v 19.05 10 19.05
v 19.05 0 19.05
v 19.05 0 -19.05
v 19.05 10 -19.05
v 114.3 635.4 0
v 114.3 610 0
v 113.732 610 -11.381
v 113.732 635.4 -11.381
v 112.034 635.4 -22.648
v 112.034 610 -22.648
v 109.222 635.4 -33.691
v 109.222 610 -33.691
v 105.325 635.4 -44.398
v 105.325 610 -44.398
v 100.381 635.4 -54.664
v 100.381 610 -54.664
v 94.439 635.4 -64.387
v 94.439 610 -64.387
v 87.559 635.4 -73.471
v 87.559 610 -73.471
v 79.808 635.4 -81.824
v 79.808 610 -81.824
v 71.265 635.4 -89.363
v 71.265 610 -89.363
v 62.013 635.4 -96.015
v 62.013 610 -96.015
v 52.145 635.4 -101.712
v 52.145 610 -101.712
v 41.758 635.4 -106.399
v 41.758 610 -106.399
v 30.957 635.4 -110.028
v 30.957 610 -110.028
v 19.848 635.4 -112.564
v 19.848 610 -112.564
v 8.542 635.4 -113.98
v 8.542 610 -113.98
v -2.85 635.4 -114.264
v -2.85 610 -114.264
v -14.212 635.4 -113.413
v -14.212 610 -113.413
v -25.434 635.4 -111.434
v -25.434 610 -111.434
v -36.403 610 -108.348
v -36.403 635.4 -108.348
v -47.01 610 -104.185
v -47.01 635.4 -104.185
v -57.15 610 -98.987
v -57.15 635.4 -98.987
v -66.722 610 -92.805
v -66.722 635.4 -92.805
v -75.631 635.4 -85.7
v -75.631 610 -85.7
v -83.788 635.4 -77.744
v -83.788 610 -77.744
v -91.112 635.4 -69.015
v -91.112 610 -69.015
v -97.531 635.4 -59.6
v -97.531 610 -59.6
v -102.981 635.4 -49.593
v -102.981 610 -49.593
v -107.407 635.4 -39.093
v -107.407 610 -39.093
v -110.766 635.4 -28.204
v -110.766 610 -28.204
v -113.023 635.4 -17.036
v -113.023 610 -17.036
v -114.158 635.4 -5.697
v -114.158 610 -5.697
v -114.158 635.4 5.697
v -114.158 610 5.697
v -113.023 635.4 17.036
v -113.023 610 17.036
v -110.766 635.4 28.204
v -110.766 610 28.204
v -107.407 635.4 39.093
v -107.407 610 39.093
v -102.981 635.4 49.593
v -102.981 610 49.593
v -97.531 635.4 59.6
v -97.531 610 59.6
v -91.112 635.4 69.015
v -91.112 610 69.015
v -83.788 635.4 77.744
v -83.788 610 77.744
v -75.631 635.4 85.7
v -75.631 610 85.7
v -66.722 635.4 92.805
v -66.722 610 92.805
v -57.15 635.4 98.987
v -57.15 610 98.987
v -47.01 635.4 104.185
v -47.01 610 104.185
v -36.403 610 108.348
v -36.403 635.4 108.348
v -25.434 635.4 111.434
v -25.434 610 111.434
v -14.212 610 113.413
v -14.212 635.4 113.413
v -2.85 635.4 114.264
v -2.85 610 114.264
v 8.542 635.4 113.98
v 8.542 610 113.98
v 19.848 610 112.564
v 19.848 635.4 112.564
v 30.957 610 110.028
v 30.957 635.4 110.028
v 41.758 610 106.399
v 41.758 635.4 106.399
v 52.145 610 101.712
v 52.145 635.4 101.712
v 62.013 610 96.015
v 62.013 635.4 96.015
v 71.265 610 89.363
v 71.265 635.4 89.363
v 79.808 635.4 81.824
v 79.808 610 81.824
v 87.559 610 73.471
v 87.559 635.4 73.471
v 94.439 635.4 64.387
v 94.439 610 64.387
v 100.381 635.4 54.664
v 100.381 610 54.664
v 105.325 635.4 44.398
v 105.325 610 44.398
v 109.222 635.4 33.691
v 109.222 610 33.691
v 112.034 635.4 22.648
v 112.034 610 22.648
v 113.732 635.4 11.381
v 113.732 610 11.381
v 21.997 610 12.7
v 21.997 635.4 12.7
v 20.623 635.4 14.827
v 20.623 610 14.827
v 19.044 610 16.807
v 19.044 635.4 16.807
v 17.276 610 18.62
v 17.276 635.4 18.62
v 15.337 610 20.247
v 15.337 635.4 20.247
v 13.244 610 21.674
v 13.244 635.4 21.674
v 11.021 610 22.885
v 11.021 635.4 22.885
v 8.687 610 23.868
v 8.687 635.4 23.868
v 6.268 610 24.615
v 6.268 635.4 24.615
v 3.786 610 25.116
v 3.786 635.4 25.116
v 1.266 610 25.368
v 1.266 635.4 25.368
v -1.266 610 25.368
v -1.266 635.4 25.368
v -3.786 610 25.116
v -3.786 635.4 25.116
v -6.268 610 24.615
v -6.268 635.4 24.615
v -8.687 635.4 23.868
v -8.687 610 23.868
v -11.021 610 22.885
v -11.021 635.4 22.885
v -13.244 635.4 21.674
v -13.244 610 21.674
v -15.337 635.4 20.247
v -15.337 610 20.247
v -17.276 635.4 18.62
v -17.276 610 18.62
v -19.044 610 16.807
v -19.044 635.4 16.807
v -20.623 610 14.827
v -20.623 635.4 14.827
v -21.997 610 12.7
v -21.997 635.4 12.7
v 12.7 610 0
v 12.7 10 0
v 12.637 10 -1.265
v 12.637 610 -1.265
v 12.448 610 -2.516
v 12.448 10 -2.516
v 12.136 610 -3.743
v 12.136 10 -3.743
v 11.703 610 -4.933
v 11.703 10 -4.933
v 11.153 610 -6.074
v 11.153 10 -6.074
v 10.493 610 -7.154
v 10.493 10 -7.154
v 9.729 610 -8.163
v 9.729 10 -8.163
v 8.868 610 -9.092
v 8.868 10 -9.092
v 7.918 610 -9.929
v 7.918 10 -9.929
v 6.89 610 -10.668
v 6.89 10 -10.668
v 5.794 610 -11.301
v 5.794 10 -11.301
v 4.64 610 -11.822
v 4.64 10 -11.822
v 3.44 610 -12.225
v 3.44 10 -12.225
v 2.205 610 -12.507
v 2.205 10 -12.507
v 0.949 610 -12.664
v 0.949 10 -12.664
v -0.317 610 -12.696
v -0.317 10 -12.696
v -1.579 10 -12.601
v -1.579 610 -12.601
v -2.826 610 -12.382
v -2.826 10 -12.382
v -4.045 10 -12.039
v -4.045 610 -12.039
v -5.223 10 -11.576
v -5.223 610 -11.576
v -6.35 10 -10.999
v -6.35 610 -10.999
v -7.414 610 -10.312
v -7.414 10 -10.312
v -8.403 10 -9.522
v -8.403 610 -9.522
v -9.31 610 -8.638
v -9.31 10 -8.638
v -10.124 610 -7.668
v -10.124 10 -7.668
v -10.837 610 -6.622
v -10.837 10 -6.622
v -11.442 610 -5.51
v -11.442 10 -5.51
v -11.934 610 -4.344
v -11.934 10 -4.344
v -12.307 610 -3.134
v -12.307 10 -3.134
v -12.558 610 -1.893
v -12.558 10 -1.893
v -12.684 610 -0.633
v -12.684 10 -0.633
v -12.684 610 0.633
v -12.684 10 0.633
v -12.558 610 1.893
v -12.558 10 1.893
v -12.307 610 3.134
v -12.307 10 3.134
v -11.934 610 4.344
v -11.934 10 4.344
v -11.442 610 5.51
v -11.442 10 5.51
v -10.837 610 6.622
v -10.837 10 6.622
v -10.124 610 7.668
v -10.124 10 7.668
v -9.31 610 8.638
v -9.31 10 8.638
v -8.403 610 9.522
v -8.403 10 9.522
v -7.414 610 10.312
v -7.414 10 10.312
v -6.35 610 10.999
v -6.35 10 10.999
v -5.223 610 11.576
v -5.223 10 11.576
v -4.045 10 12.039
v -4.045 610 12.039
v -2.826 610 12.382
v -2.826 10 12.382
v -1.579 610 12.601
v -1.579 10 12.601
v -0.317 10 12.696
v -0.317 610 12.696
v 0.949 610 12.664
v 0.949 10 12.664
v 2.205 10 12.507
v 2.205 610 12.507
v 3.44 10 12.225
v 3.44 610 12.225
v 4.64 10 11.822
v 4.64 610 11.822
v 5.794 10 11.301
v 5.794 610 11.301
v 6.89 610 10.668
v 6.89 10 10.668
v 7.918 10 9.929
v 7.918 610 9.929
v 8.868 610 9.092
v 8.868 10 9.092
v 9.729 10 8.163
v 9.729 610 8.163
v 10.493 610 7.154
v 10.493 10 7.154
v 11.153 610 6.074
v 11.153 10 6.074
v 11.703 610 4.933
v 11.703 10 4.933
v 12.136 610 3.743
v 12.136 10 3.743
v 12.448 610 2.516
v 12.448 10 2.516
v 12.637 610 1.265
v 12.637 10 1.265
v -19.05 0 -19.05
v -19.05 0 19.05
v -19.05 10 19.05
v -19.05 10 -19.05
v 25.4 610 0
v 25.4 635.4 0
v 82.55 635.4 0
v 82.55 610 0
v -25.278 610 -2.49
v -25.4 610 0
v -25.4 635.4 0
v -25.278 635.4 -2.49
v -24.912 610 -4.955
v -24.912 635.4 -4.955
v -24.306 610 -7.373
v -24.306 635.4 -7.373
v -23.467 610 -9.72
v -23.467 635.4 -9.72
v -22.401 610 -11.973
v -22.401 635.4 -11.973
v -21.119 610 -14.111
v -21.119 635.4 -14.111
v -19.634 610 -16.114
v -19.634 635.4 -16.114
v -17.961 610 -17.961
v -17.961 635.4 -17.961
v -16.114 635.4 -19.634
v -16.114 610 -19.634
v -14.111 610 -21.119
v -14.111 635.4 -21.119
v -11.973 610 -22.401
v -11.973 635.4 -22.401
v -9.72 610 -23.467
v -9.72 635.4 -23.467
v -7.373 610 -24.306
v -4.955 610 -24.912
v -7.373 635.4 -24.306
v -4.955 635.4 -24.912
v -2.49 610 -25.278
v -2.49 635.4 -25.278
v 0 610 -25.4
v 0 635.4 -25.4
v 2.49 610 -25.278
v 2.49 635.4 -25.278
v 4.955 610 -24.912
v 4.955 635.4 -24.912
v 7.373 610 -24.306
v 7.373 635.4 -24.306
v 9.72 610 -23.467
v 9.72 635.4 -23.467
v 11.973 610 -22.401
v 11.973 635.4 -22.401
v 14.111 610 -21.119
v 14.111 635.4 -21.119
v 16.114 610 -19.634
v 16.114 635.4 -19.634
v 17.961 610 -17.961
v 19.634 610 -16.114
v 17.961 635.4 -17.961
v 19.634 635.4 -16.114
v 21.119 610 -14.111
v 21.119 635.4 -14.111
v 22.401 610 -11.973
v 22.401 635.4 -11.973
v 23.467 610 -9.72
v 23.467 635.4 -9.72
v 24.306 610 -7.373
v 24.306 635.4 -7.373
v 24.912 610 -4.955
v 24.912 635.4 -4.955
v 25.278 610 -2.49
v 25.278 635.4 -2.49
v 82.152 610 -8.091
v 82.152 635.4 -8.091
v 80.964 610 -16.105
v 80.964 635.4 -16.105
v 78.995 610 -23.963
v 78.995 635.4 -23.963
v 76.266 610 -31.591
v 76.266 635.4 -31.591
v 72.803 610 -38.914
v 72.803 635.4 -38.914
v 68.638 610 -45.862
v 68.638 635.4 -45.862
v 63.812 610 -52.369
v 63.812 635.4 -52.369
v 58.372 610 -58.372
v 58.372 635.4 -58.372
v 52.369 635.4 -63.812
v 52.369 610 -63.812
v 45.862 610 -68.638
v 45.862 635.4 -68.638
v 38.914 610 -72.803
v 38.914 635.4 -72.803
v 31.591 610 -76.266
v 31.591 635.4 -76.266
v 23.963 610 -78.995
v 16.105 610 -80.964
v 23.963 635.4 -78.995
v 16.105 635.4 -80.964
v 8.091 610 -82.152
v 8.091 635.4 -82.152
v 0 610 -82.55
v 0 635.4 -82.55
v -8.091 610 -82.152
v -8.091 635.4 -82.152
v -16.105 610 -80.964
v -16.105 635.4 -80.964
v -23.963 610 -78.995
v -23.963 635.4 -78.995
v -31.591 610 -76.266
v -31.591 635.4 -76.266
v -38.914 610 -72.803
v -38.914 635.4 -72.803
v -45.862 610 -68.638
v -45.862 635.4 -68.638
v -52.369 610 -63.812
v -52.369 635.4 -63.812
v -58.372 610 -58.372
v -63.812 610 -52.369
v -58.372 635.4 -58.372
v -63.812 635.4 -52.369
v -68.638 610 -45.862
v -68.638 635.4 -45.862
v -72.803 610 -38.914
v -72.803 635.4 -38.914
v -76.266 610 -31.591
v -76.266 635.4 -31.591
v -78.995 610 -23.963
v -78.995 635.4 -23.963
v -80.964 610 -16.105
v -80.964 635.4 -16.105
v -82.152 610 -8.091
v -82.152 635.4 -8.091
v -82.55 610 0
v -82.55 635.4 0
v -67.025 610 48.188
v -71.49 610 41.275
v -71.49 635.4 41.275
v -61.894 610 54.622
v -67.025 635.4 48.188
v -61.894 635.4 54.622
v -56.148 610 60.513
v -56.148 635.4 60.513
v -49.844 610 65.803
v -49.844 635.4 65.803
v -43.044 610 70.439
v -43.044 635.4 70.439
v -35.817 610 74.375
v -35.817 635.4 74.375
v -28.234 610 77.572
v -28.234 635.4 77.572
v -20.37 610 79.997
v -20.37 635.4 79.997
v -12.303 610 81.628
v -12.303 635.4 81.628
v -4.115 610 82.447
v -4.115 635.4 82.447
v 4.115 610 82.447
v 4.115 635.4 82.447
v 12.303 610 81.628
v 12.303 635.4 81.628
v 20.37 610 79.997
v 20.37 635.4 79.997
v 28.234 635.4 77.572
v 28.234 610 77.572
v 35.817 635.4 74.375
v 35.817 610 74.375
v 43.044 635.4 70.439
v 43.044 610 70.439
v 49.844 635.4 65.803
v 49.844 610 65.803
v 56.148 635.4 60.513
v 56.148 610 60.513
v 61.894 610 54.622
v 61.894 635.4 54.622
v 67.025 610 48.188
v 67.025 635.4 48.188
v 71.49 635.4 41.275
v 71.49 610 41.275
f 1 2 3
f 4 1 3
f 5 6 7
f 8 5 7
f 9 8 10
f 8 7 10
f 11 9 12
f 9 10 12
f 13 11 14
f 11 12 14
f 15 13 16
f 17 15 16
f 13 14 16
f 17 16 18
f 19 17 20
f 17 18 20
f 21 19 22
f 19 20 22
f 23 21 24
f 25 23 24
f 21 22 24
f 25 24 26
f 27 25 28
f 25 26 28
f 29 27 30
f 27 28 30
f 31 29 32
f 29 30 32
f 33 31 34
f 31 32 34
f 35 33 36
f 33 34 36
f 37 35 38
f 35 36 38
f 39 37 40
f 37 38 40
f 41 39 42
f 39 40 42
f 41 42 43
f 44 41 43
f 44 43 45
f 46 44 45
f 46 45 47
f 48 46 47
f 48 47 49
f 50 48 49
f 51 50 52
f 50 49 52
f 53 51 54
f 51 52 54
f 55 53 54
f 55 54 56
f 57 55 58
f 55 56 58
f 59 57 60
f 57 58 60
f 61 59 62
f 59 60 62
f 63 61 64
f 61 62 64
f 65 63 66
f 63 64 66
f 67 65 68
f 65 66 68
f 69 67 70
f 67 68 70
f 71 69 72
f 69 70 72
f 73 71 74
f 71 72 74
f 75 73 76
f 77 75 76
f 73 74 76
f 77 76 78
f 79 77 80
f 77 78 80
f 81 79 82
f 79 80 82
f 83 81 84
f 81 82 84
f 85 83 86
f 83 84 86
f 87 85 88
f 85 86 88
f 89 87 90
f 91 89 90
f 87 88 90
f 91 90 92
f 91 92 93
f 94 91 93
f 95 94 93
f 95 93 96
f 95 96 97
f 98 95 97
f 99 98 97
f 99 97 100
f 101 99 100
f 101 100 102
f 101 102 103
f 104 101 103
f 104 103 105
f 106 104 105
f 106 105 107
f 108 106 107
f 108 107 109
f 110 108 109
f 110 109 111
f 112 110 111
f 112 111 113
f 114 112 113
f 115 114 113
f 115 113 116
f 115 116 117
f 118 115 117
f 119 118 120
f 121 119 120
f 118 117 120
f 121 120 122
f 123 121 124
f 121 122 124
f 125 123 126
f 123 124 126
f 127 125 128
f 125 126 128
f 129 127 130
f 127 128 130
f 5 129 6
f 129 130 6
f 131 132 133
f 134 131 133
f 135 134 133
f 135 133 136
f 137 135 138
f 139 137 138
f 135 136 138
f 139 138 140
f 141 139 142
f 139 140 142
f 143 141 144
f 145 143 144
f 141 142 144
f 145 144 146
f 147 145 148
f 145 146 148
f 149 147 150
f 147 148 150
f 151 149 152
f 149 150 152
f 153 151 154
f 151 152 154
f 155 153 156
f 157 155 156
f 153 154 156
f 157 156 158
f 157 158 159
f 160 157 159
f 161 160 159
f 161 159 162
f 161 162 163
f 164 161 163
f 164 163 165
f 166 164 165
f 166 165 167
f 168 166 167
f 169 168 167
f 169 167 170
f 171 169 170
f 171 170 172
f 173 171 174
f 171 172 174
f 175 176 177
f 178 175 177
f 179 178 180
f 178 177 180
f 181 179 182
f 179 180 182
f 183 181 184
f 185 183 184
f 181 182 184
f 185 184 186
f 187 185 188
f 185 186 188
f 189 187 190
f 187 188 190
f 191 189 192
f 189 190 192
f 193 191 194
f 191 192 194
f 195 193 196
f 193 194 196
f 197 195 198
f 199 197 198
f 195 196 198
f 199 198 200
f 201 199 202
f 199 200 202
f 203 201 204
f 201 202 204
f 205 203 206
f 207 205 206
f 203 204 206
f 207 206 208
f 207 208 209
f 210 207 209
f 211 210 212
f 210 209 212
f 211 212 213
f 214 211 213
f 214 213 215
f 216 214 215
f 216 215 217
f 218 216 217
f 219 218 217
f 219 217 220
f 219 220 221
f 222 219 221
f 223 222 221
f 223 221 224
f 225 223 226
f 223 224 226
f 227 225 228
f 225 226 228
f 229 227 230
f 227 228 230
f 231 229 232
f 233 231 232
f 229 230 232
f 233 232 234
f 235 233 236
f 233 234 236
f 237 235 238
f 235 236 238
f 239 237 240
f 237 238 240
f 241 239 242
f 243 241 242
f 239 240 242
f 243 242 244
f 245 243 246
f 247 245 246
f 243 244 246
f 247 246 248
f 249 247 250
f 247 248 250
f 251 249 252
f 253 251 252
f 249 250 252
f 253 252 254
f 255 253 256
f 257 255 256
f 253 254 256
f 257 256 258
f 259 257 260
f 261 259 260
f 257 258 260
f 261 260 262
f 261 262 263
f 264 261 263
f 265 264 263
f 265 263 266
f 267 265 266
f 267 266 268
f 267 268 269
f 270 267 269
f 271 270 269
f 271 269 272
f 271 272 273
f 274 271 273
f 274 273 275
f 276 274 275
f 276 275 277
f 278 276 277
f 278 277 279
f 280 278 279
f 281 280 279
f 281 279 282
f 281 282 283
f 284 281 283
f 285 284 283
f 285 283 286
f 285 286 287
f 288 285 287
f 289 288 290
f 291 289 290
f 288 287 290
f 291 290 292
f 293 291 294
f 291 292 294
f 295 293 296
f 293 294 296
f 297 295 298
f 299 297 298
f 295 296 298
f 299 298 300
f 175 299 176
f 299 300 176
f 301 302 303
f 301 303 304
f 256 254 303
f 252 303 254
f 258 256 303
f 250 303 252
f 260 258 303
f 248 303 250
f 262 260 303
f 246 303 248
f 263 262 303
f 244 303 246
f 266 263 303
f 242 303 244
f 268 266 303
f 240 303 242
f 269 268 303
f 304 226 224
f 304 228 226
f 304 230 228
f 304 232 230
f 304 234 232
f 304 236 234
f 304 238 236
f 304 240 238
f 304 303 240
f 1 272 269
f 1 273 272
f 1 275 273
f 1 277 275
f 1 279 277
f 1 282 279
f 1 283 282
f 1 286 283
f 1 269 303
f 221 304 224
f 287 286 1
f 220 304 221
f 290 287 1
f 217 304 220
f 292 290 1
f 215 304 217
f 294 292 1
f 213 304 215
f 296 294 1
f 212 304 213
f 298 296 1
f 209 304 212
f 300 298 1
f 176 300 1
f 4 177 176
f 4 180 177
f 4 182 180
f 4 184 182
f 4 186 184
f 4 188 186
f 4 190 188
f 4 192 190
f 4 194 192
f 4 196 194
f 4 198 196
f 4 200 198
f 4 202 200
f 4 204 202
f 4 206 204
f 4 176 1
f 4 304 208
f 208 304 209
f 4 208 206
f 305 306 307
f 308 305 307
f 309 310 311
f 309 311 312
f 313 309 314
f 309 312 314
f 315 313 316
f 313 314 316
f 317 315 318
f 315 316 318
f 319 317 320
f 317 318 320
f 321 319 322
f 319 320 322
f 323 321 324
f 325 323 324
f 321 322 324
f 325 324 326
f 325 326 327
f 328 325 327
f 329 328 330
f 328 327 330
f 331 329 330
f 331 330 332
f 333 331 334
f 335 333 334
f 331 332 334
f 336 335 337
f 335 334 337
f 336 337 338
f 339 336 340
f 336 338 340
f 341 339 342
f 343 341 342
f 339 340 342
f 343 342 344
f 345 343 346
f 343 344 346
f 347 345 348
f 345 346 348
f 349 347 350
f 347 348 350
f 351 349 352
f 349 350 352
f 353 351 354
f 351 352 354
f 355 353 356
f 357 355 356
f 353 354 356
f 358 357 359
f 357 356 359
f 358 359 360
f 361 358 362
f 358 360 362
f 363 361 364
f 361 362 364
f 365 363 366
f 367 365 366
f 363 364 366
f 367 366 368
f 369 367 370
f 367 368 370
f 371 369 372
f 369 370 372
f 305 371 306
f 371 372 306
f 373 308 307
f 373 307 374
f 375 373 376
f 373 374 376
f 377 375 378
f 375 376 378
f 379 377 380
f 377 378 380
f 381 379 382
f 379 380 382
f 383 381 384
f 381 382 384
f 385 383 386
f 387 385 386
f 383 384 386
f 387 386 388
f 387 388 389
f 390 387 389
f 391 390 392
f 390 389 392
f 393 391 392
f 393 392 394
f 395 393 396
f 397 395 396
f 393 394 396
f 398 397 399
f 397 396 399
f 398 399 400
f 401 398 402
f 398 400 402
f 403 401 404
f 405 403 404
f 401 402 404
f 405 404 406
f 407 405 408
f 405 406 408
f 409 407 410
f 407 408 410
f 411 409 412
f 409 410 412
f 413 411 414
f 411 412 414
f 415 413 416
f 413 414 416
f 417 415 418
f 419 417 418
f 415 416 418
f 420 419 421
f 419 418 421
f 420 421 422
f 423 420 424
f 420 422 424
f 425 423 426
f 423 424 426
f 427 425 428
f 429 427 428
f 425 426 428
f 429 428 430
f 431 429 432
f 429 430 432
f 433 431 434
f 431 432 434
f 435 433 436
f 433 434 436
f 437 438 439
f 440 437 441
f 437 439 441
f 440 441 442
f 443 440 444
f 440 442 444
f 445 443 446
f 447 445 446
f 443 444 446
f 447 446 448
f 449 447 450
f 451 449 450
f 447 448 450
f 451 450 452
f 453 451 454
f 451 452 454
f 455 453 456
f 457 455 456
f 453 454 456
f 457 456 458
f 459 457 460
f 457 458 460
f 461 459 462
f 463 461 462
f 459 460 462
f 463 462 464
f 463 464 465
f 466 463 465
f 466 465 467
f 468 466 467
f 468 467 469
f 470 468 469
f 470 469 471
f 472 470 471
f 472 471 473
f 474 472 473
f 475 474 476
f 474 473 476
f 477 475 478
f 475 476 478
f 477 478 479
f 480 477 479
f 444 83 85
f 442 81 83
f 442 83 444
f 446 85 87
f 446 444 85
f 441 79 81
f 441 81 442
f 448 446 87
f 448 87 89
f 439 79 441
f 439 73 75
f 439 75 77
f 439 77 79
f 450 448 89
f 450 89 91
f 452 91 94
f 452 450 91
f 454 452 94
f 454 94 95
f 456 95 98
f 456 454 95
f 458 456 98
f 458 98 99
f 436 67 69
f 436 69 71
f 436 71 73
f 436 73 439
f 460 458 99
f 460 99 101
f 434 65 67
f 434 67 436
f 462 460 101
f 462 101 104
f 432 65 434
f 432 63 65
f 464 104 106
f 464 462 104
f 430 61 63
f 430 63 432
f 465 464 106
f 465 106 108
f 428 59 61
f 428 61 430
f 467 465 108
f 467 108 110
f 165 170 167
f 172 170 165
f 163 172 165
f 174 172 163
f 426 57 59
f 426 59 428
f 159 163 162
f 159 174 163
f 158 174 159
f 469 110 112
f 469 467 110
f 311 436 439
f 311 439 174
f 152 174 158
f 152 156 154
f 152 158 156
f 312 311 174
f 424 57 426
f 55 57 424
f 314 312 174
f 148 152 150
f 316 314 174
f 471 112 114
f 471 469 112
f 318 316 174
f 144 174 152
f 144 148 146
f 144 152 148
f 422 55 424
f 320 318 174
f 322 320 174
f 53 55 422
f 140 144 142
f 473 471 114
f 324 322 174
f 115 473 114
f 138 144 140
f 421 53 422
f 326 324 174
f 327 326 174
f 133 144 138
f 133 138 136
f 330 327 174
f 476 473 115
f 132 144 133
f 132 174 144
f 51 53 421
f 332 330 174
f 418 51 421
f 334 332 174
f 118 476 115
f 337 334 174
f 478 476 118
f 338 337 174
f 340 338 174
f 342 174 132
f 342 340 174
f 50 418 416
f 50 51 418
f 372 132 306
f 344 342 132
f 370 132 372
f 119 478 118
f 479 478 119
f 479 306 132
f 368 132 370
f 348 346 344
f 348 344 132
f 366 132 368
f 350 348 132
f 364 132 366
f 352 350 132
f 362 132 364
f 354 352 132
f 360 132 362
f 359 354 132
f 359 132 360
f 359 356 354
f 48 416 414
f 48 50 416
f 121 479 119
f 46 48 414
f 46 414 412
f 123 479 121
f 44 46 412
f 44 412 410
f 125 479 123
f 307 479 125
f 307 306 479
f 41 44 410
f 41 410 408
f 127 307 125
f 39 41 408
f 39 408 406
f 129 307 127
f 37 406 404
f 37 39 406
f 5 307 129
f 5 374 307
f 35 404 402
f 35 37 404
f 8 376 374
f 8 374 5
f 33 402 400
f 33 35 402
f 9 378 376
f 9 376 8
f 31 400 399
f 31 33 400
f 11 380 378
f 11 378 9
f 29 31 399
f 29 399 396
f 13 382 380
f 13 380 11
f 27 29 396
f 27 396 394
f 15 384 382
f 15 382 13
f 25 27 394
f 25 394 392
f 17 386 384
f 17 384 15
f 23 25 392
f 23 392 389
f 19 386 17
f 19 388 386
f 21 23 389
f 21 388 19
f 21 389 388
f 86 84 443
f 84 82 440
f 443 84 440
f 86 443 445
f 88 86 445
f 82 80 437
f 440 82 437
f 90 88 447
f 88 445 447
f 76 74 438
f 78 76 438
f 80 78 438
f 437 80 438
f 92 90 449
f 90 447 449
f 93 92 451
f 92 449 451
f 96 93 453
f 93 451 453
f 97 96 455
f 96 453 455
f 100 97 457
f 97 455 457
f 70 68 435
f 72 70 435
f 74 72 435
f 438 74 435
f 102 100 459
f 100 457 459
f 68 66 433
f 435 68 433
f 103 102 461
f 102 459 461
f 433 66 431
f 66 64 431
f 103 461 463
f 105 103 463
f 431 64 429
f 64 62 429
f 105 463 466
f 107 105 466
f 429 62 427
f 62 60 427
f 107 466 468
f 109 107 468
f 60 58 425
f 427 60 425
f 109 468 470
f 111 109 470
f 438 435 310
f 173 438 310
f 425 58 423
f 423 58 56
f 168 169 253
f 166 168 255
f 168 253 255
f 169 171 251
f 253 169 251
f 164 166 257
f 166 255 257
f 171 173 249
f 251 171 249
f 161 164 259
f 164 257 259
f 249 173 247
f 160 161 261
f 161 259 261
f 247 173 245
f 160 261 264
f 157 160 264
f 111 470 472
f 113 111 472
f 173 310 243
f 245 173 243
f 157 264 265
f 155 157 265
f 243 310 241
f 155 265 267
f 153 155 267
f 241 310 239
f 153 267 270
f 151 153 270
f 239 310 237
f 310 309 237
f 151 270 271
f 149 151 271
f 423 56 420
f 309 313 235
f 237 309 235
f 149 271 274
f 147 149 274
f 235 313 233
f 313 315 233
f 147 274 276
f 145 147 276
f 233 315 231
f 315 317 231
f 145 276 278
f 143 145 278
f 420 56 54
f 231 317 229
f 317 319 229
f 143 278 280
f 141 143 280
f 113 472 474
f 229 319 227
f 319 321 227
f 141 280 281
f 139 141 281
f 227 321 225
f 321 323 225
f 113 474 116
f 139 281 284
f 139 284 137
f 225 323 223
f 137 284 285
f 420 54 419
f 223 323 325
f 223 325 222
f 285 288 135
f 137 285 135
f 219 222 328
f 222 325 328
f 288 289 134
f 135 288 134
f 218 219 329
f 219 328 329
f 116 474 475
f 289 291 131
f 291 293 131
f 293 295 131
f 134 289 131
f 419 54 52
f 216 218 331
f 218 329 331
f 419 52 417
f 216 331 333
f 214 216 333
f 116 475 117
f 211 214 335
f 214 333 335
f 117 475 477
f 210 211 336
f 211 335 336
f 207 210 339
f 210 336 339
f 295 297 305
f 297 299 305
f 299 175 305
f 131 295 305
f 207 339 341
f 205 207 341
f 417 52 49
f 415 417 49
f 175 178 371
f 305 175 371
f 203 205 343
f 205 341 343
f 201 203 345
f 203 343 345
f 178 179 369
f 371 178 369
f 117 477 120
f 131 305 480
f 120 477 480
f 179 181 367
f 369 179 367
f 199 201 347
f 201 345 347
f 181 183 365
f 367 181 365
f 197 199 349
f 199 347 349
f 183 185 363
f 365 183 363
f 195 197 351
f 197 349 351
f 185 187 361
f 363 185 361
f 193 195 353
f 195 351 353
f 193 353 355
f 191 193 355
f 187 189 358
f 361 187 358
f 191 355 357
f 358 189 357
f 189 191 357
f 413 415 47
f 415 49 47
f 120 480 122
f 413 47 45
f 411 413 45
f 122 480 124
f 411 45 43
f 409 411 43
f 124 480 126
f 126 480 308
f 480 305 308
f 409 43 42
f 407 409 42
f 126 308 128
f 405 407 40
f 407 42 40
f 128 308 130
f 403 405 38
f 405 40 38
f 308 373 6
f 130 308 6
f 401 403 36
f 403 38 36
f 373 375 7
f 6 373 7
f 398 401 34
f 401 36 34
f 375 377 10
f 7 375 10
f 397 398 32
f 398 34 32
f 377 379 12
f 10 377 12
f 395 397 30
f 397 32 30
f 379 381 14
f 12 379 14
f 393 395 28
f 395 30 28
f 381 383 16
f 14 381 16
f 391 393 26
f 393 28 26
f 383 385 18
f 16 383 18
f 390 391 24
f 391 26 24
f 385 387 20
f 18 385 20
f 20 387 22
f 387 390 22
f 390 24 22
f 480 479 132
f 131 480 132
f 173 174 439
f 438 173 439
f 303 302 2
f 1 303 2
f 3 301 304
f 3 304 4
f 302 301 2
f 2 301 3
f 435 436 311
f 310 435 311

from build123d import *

# Parameters (mm, degrees)
SKETCH1_W           = 38.1
SKETCH1_H           = 38.1
BOSS_EXTRUDE1_DEPTH = 10
SKETCH2_R           = 12.7
BOSS_EXTRUDE2_DEPTH = 600
SKETCH3_R           = 114.3
BOSS_EXTRUDE3_DEPTH = 25.4
CUT_EXTRUDE2_DEPTH  = 25.4


with BuildPart() as part:
    # Sketch1 → Boss-Extrude1 (new body)
    with BuildSketch(Plane(origin=(0, 0, 0), x_dir=(1, 0, 0), z_dir=(0, 1, 0))):
        Rectangle(SKETCH1_W, SKETCH1_H)
    extrude(amount=BOSS_EXTRUDE1_DEPTH)

    # Sketch2 → Boss-Extrude2 (add)
    with BuildSketch(Plane(origin=(0, 10, 0), x_dir=(1, 0, 0), z_dir=(0, 1, 0))):
        Circle(SKETCH2_R)
    extrude(amount=BOSS_EXTRUDE2_DEPTH)

    # Sketch3 → Boss-Extrude3 (add)
    with BuildSketch(Plane(origin=(0, 610, 0), x_dir=(1, 0, 0), z_dir=(0, 1, 0))):
        Circle(SKETCH3_R)
    extrude(amount=BOSS_EXTRUDE3_DEPTH)

    # Sketch5 → Cut-Extrude2 (cut)
    with BuildSketch(Plane(origin=(0, 635.4, 0), x_dir=(1, 0, 0), z_dir=(0, 1, 0))):
        with BuildLine():
            Line((25.4, 0), (82.55, 0))
            ThreePointArc((82.55, 0), (0, 82.55), (-82.55, 0))
            Line((-82.55, 0), (-25.4, 0))
            ThreePointArc((-25.4, 0), (0, 25.4), (25.4, 0))
        make_face()
        with BuildLine():
            Line((71.490397082, -41.275), (21.997045256, -12.7))
            ThreePointArc((21.997045256, -12.7), (0, -25.4), (-21.997045256, -12.7))
            Line((-21.997045256, -12.7), (-71.490397082, -41.275))
            ThreePointArc((-71.490397082, -41.275), (0, -82.55), (71.490397082, -41.275))
        make_face()
    extrude(amount=-CUT_EXTRUDE2_DEPTH, mode=Mode.SUBTRACT)


solid = part.part
